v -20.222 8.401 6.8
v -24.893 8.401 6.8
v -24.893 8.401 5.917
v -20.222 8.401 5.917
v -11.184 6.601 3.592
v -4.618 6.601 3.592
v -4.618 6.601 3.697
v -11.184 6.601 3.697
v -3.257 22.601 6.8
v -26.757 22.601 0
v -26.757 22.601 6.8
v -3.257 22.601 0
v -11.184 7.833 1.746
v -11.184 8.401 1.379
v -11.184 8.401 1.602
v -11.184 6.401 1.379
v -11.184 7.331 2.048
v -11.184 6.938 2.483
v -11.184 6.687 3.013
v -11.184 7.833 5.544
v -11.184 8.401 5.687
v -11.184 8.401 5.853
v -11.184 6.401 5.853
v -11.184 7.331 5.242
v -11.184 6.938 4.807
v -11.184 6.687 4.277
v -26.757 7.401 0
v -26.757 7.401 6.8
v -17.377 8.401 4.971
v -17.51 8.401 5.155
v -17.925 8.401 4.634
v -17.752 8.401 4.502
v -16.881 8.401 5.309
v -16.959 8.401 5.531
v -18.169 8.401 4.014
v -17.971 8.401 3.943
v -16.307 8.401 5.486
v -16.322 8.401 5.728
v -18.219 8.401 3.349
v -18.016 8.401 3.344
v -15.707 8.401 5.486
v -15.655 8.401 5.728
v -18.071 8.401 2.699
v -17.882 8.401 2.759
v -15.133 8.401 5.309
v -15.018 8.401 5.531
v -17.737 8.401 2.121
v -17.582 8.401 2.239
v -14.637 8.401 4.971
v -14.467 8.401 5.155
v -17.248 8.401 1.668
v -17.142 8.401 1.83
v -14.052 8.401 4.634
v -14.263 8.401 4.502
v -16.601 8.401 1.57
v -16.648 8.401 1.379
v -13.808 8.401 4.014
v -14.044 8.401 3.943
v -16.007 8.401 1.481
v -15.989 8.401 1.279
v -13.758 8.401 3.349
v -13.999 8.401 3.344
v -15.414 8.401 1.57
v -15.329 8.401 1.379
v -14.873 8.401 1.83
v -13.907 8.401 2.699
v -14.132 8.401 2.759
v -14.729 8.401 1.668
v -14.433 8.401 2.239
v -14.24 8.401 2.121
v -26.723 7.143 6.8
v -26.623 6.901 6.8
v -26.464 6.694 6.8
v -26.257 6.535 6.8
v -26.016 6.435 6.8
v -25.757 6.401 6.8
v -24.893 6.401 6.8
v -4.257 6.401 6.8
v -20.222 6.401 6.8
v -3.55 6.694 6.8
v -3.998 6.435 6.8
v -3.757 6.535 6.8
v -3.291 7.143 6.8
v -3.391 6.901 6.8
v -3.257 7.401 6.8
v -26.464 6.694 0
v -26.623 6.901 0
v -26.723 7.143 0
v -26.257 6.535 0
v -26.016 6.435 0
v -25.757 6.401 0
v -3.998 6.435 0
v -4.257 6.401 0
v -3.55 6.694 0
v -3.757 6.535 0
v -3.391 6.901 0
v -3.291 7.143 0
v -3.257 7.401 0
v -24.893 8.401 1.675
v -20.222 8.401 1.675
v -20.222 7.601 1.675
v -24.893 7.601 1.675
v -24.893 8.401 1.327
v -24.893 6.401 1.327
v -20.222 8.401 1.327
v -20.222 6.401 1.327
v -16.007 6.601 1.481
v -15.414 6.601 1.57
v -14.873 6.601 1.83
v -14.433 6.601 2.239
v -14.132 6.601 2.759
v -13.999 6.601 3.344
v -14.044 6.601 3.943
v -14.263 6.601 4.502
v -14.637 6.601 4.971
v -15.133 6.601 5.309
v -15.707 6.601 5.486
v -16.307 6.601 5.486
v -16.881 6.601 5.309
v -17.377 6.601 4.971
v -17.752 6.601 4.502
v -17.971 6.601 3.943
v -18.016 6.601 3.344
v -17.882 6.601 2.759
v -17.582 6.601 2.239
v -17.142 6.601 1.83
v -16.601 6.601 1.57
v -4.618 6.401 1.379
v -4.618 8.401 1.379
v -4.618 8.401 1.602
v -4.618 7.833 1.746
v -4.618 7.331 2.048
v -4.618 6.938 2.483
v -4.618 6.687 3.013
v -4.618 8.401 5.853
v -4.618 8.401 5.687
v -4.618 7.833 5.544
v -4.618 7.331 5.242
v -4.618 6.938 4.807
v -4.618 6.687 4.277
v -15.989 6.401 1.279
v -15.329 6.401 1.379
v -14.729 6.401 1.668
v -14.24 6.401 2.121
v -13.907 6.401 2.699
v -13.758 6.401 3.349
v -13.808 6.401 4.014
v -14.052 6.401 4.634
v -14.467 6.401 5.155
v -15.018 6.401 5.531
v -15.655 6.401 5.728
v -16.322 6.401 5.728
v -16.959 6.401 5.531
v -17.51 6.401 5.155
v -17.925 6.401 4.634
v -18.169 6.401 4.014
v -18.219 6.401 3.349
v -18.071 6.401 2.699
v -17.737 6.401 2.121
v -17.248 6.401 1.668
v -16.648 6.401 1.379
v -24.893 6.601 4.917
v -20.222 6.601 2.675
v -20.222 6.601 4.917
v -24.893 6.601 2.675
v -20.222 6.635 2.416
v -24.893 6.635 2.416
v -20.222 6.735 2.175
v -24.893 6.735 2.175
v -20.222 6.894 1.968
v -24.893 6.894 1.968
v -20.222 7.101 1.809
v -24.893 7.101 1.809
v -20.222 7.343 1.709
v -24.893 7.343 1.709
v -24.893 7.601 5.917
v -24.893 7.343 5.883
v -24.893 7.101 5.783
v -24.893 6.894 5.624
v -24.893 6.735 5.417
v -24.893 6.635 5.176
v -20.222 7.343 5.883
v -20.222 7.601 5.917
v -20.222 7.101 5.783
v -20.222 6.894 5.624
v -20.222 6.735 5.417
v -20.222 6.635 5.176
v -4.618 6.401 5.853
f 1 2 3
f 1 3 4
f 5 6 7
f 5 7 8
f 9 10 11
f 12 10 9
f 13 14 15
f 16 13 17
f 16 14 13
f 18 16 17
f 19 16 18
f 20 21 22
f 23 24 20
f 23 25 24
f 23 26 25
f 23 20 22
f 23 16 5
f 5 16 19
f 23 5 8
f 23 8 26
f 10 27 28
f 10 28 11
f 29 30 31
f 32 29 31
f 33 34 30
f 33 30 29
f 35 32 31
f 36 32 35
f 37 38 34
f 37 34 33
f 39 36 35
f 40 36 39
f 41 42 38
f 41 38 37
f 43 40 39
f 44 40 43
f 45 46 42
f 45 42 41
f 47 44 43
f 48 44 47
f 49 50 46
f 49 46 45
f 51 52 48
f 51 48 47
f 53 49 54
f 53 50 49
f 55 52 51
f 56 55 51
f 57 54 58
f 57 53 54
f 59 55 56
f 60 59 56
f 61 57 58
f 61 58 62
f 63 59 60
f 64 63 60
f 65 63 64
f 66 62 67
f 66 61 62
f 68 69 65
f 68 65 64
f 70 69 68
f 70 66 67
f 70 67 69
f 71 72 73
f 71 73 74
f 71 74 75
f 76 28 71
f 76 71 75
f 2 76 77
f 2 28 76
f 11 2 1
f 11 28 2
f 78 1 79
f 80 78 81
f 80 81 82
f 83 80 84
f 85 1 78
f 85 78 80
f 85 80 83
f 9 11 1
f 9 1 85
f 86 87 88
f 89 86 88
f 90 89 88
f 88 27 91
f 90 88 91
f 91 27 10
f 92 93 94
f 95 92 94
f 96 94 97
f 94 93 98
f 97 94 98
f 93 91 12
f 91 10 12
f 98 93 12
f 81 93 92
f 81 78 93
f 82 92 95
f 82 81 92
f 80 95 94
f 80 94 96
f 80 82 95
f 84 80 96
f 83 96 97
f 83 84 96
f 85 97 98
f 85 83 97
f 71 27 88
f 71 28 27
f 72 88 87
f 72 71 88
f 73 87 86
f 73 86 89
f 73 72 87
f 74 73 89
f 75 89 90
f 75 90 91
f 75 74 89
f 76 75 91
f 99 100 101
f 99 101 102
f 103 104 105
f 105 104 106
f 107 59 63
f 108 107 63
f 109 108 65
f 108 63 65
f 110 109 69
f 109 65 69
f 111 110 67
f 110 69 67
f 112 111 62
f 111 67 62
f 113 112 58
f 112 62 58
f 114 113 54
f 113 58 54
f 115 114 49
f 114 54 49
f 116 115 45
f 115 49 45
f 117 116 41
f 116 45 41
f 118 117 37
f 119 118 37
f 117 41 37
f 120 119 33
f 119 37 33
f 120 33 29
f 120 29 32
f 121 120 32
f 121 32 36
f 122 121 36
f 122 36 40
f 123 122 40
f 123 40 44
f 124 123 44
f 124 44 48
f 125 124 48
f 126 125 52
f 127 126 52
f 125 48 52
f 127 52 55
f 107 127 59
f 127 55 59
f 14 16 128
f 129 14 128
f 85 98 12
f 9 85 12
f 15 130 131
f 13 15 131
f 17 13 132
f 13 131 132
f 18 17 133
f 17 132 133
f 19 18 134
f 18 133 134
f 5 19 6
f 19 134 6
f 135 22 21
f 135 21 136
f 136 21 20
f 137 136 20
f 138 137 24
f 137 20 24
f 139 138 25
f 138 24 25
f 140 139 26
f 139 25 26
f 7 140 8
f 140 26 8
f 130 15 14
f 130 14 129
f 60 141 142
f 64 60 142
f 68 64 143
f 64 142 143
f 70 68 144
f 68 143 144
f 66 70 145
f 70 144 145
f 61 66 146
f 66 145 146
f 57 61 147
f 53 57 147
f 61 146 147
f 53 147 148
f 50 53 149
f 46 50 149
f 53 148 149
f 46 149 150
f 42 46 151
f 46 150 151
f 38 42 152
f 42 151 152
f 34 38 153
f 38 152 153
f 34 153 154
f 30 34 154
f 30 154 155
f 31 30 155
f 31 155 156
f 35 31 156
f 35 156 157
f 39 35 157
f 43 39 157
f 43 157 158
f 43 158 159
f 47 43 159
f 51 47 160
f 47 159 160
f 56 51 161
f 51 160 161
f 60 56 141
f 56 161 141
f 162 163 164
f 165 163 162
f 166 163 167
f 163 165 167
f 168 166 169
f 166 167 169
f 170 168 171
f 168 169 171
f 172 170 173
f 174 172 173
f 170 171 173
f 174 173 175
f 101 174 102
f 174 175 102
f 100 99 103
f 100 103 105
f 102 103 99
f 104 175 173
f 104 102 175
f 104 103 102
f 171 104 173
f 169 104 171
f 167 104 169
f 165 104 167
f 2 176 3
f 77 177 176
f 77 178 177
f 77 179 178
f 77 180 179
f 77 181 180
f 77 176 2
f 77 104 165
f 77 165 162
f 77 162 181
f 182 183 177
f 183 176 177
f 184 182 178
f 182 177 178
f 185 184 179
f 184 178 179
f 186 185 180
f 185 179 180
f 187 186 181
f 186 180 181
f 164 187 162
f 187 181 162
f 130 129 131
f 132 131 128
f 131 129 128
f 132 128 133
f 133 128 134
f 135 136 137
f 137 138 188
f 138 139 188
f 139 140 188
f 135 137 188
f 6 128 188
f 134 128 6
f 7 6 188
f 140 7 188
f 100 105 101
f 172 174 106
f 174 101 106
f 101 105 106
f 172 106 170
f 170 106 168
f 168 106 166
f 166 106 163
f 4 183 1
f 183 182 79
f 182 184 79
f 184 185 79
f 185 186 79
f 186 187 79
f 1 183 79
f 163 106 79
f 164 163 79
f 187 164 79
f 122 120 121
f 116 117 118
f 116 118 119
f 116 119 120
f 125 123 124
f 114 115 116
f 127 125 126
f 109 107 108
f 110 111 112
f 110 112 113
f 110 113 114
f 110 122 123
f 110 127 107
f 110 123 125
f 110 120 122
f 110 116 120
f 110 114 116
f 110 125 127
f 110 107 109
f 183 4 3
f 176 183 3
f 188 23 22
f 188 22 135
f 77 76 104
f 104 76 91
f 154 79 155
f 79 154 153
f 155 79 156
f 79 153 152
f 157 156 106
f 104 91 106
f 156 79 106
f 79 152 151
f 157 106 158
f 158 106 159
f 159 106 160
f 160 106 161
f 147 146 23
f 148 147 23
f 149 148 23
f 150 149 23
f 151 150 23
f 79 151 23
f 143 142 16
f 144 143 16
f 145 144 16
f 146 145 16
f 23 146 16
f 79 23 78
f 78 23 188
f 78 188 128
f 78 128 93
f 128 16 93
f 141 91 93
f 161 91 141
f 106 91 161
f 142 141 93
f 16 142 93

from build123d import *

# Parameters (mm, degrees)
SKETCH1_W           = 23.5
SKETCH1_H           = 16.2
BOSS_EXTRUDE1_DEPTH = 6.8
FILLET1_R           = 1
SKETCH2_R           = 2.236571794
SKETCH2_W           = 6.565566979
SKETCH2_H           = 4.473143588
SKETCH2_W_2         = 4.671371309
SKETCH2_H_2         = 6.069279627
CUT_EXTRUDE1_DEPTH  = 2
SKETCH3_W           = 4.671371309
SKETCH3_H           = 4.241891526
SKETCH3_W_2         = 6.565566979
SKETCH3_H_2         = 4.084917802
BOSS_EXTRUDE2_DEPTH = 1.8
FILLET2_R           = 1
FILLET3_R           = 2
SKETCH4_R           = 2.01406143
BOSS_EXTRUDE3_DEPTH = 1.8


with BuildPart() as part:
    # Sketch1 → Boss-Extrude1 (new body)
    with BuildSketch(Plane.XY):
        with Locations((-15.007054392, 14.50136894)):
            Rectangle(SKETCH1_W, SKETCH1_H)
    extrude(amount=BOSS_EXTRUDE1_DEPTH)

    # Fillet1
    fillet1_edges = [part.edges().sort_by_distance(p)[0] for p in [
        (-3.257054392, 6.40136894, 3.4),
        (-26.757054392, 6.40136894, 3.4),
    ]]
    fillet(fillet1_edges, radius=FILLET1_R)

    # Sketch2 → Cut-Extrude1 (cut)
    with BuildSketch(Plane.XZ.offset(-6.40136894)):
        with Locations(Location((-15.988556768, 3.515941097, 0), (0, 0, 270))):
            Circle(SKETCH2_R)
        with Locations((-7.901211447, 3.615950214)):
            Rectangle(SKETCH2_W, SKETCH2_H)
        with Locations((-22.557799993, 4.361535506)):
            Rectangle(SKETCH2_W_2, SKETCH2_H_2)
    extrude(amount=-CUT_EXTRUDE1_DEPTH, mode=Mode.SUBTRACT)

    # Sketch3 → Boss-Extrude2 (add)
    with BuildSketch(Plane(origin=(0, 8.40136894, 0), x_dir=(-1, 0, 0), z_dir=(0, -1, 0))):
        with Locations((22.557799993, -3.796232689)):
            Rectangle(SKETCH3_W, SKETCH3_H)
        with Locations((7.901211447, -3.644866315)):
            Rectangle(SKETCH3_W_2, SKETCH3_H_2)
    extrude(amount=BOSS_EXTRUDE2_DEPTH)

    # Fillet2
    fillet2_edges = [part.edges().sort_by_distance(p)[0] for p in [
        (-22.557799992, 6.60136894, 5.917178452),
        (-22.557799992, 6.60136894, 1.675286926),
    ]]
    fillet(fillet2_edges, radius=FILLET2_R)

    # Fillet3
    # the kernel refuses this fillet: 2 mm, written as the material it takes off along each edge
    with BuildSketch(Plane(origin=(-11.183994936, 6.60136894, 5.687325216), x_dir=(0, 1, 0), z_dir=(1, 0, 0))) as fillet3_piece_1:
        with BuildLine():
            CenterArc((2, -1.989974874), FILLET3_R, 95.739170477, 84.260829523)
            Line((0, -1.989974874), (0, 0))
            Line((0, 0), (1.8, 0))
        make_face()
    extrude(amount=6.565566979, mode=Mode.SUBTRACT)
    with BuildSketch(Plane(origin=(-4.618427957, 6.60136894, 1.602407414), x_dir=(0, 0, 1), z_dir=(-1, 0, 0))) as fillet3_piece_2:
        with BuildLine():
            CenterArc((1.989974874, 2), FILLET3_R, 185.739170477, 84.260829523)
            Line((0, 1.8), (0, 0))
            Line((0, 0), (1.989974874, 0))
        make_face()
    extrude(amount=6.565566979, mode=Mode.SUBTRACT)

    # Sketch4 → Boss-Extrude3 (add)
    with BuildSketch(Plane(origin=(0, 8.40136894, 0), x_dir=(-1, 0, 0), z_dir=(0, -1, 0))):
        with Locations(Location((16.007293958, -3.494565095, 0), (0, 0, 90))):
            Circle(SKETCH4_R)
    extrude(amount=BOSS_EXTRUDE3_DEPTH)


solid = part.part
